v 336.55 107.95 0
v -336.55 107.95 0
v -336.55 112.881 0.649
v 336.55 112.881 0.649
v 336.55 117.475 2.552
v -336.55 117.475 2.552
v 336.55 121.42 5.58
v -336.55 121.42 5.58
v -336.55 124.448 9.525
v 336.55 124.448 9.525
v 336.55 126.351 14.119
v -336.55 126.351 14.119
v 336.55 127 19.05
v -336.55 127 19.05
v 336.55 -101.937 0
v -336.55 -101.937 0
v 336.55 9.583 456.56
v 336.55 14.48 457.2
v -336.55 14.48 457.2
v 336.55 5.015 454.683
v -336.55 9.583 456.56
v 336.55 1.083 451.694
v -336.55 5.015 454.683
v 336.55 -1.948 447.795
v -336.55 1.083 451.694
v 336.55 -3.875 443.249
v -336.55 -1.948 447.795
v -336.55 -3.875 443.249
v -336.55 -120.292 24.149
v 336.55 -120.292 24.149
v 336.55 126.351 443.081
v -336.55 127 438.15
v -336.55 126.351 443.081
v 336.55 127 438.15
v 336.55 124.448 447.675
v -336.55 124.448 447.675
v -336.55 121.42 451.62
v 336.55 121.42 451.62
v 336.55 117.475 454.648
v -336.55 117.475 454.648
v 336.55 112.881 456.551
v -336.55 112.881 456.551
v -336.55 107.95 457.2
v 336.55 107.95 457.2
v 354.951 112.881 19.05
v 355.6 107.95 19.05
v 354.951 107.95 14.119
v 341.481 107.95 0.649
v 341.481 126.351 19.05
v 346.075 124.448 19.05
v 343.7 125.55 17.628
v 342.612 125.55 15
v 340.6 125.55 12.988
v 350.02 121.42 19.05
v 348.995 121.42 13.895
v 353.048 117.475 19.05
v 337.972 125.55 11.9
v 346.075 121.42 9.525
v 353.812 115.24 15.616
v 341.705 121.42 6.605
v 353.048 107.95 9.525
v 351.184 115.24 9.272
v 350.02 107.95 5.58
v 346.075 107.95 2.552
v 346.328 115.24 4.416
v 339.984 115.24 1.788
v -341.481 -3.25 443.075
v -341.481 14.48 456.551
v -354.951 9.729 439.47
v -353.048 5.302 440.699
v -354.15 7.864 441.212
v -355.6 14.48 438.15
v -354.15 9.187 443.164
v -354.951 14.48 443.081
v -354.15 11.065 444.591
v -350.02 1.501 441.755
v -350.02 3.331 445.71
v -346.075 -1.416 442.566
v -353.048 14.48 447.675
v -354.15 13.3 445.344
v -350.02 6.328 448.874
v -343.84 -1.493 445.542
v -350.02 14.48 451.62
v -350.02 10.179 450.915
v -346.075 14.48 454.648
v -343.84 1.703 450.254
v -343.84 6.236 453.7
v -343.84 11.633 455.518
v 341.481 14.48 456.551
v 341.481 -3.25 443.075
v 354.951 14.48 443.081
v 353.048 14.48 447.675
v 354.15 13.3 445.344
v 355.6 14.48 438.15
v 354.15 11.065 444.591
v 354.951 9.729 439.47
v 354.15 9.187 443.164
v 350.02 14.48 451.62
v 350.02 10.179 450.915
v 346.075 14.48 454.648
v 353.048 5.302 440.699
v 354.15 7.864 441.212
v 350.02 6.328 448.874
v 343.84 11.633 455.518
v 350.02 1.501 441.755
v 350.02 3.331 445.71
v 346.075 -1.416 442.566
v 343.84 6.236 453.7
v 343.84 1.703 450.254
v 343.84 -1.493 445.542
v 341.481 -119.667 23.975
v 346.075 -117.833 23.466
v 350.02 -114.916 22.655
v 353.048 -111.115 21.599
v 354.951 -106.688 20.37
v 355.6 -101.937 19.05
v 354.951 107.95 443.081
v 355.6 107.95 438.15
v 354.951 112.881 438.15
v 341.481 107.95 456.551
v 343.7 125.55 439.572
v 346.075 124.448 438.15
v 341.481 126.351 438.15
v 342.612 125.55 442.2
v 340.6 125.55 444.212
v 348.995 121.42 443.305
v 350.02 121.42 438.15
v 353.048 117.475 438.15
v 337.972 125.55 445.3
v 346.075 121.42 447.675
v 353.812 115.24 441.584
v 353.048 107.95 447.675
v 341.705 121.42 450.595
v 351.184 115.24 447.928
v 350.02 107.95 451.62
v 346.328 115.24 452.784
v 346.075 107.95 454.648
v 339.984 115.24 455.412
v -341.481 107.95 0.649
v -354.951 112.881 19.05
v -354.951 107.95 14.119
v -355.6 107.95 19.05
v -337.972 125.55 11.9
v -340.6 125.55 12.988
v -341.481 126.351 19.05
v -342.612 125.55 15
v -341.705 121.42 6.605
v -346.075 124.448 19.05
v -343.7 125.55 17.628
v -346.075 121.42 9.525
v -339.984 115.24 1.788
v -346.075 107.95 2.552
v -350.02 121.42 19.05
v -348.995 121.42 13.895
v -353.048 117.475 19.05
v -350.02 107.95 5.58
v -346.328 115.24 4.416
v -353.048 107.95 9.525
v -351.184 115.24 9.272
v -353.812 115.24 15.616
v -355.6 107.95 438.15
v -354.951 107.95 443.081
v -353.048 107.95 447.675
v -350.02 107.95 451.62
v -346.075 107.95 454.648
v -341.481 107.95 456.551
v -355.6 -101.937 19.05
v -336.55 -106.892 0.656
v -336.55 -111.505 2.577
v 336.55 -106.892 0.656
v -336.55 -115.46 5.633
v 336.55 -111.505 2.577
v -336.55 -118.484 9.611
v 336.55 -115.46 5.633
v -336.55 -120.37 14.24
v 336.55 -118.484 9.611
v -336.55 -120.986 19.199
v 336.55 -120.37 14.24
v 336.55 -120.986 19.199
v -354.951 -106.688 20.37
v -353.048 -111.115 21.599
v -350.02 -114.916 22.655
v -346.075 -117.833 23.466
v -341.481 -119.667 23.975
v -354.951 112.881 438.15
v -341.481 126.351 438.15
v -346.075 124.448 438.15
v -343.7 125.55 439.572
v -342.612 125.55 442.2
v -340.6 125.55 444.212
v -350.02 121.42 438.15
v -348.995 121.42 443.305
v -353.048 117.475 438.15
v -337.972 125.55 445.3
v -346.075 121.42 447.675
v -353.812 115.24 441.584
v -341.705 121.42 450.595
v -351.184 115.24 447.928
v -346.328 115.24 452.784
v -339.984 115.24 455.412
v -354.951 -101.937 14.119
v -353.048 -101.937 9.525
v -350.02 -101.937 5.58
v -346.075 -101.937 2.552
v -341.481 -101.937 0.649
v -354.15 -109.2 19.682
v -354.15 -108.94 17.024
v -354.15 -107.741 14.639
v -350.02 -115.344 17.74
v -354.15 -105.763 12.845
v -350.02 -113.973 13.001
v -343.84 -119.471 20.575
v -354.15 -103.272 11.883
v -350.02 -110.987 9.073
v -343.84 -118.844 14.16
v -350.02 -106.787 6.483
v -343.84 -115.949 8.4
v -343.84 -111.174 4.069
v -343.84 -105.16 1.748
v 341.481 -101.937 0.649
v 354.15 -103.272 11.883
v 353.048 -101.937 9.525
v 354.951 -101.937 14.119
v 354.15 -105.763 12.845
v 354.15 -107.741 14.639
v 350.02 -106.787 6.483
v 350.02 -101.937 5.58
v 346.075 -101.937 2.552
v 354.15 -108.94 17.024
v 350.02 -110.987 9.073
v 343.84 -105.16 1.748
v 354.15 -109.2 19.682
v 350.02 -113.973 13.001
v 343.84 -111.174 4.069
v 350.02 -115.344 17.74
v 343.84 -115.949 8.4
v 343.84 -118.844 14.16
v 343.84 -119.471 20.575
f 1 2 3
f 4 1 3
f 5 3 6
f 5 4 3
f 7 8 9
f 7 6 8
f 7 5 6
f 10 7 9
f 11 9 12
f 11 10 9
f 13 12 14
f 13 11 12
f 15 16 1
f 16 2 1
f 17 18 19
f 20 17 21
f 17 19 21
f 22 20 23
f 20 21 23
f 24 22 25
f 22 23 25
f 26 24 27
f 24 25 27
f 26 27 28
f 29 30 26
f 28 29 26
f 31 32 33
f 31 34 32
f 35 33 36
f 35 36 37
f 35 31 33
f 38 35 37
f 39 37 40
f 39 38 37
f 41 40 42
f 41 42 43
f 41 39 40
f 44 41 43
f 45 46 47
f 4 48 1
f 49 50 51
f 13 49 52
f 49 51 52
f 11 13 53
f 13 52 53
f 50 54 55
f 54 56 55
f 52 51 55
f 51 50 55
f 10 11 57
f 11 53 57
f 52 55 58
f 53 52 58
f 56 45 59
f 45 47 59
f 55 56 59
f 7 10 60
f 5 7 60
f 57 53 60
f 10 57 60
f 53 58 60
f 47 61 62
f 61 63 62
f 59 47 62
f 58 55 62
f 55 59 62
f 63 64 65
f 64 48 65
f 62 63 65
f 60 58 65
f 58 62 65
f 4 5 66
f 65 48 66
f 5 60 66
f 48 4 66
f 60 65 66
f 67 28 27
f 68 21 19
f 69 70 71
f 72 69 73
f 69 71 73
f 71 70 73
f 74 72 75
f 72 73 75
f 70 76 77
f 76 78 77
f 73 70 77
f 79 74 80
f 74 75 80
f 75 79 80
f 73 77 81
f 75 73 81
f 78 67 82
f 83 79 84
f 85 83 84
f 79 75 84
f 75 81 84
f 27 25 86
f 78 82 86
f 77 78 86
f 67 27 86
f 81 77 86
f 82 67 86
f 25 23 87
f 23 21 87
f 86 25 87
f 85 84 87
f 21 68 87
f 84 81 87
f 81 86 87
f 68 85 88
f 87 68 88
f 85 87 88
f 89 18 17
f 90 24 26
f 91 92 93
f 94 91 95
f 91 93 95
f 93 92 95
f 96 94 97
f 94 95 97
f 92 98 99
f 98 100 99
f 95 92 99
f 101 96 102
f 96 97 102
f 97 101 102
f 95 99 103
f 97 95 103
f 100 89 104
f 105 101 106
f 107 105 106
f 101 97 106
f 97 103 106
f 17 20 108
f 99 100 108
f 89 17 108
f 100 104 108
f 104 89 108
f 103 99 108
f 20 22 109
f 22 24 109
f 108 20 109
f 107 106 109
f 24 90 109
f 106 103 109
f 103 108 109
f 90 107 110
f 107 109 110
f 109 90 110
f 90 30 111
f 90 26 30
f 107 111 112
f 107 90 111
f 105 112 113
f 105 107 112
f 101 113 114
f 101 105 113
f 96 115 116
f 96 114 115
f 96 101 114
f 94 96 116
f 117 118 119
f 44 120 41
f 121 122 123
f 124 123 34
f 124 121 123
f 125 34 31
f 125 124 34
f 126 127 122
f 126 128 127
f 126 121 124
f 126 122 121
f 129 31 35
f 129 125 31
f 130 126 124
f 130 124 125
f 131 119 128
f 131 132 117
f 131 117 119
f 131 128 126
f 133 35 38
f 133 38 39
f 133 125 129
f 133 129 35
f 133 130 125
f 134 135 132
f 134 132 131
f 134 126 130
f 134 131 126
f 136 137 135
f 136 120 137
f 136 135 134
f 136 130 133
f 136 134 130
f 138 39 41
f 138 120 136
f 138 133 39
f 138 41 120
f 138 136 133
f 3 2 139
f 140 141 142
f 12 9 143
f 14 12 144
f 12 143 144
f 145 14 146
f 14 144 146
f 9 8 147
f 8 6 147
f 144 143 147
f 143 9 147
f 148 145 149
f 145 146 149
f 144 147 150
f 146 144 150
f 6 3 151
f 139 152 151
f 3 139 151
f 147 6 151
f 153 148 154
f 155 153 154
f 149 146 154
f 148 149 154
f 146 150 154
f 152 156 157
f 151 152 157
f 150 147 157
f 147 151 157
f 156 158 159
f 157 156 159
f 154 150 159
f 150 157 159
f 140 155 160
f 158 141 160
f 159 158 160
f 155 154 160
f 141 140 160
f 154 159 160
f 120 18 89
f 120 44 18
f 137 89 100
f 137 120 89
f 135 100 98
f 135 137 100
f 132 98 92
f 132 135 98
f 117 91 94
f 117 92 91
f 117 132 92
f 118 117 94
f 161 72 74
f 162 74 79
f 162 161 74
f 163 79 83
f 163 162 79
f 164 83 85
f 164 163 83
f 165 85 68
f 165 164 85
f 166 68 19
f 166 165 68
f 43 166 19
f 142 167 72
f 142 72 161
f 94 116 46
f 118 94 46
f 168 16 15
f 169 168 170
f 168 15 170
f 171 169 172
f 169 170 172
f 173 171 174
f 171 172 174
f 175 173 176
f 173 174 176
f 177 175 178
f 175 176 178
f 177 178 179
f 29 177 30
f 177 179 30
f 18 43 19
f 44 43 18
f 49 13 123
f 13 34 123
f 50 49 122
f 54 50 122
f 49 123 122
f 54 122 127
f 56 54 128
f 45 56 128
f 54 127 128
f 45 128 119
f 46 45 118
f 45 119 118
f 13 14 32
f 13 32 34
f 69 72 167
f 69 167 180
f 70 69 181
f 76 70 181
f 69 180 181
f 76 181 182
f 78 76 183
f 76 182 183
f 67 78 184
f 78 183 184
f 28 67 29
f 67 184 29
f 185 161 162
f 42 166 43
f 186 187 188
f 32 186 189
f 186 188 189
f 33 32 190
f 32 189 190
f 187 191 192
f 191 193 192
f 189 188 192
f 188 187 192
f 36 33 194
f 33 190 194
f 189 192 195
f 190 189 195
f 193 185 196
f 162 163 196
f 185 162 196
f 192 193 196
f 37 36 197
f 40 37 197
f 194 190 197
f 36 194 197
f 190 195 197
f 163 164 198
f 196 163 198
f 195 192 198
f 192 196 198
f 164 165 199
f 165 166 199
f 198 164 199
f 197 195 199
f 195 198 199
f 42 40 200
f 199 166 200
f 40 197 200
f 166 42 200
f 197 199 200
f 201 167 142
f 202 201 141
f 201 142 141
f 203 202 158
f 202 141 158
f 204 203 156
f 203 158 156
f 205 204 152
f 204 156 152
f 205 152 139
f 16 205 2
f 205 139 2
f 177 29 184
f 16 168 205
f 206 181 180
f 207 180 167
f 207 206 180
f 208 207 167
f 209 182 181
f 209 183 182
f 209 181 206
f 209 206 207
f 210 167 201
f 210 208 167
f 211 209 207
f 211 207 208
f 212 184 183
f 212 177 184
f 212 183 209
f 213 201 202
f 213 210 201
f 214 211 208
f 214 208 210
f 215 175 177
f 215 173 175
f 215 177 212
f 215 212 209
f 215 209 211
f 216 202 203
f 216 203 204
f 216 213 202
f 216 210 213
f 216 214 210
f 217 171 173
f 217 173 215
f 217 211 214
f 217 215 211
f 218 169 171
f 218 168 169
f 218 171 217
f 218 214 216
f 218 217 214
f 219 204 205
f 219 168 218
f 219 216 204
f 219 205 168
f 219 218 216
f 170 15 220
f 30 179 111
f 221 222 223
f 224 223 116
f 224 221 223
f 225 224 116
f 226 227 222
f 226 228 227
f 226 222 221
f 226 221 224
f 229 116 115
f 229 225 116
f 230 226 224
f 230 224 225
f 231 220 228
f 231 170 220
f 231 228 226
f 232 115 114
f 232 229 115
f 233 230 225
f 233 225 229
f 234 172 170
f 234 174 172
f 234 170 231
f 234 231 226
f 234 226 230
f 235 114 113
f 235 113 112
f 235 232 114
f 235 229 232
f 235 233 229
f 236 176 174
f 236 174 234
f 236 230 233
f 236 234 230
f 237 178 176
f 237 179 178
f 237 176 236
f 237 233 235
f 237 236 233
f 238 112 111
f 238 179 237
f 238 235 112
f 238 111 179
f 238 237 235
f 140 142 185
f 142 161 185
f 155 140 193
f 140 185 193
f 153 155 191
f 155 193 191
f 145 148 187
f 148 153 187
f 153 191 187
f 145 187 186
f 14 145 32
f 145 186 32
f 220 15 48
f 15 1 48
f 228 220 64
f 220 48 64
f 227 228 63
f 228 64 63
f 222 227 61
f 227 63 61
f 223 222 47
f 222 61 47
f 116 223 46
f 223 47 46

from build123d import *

# Parameters (mm, degrees)
F0_W     = 711.2
F0_H     = 254
F1_DEPTH = 457.2
F3_DEPTH = 711.201
F4_R     = 19.05


with BuildPart() as f1:
    # F0 (on Top) → F1 (new body)
    with BuildSketch(Plane.XY):
        Rectangle(F0_W, F0_H)
    extrude(amount=F1_DEPTH)

    # F2 (on face) → F3 (cut, through all)
    with BuildSketch(Plane.YZ.offset(355.6)):
        Polygon((-127, 457.2), (-127, 0), (0, 457.2), align=None)
    extrude(amount=-F3_DEPTH, mode=Mode.SUBTRACT)

    # F4
    f4_edges = [f1.edges().sort_by_distance(p)[0] for p in [
        (0, -127, 0),
        (355.6, 0, 0),
        (355.6, -63.5, 228.6),
        (-355.6, -63.5, 228.6),
        (-355.6, 0, 0),
        (-355.6, 63.5, 457.2),
        (0, 0, 457.2),
        (355.6, 63.5, 457.2),
        (355.6, 127, 228.6),
        (0, 127, 0),
        (-355.6, 127, 228.6),
        (0, 127, 457.2),
    ]]
    fillet(f4_edges, radius=F4_R)


solid = f1.part
